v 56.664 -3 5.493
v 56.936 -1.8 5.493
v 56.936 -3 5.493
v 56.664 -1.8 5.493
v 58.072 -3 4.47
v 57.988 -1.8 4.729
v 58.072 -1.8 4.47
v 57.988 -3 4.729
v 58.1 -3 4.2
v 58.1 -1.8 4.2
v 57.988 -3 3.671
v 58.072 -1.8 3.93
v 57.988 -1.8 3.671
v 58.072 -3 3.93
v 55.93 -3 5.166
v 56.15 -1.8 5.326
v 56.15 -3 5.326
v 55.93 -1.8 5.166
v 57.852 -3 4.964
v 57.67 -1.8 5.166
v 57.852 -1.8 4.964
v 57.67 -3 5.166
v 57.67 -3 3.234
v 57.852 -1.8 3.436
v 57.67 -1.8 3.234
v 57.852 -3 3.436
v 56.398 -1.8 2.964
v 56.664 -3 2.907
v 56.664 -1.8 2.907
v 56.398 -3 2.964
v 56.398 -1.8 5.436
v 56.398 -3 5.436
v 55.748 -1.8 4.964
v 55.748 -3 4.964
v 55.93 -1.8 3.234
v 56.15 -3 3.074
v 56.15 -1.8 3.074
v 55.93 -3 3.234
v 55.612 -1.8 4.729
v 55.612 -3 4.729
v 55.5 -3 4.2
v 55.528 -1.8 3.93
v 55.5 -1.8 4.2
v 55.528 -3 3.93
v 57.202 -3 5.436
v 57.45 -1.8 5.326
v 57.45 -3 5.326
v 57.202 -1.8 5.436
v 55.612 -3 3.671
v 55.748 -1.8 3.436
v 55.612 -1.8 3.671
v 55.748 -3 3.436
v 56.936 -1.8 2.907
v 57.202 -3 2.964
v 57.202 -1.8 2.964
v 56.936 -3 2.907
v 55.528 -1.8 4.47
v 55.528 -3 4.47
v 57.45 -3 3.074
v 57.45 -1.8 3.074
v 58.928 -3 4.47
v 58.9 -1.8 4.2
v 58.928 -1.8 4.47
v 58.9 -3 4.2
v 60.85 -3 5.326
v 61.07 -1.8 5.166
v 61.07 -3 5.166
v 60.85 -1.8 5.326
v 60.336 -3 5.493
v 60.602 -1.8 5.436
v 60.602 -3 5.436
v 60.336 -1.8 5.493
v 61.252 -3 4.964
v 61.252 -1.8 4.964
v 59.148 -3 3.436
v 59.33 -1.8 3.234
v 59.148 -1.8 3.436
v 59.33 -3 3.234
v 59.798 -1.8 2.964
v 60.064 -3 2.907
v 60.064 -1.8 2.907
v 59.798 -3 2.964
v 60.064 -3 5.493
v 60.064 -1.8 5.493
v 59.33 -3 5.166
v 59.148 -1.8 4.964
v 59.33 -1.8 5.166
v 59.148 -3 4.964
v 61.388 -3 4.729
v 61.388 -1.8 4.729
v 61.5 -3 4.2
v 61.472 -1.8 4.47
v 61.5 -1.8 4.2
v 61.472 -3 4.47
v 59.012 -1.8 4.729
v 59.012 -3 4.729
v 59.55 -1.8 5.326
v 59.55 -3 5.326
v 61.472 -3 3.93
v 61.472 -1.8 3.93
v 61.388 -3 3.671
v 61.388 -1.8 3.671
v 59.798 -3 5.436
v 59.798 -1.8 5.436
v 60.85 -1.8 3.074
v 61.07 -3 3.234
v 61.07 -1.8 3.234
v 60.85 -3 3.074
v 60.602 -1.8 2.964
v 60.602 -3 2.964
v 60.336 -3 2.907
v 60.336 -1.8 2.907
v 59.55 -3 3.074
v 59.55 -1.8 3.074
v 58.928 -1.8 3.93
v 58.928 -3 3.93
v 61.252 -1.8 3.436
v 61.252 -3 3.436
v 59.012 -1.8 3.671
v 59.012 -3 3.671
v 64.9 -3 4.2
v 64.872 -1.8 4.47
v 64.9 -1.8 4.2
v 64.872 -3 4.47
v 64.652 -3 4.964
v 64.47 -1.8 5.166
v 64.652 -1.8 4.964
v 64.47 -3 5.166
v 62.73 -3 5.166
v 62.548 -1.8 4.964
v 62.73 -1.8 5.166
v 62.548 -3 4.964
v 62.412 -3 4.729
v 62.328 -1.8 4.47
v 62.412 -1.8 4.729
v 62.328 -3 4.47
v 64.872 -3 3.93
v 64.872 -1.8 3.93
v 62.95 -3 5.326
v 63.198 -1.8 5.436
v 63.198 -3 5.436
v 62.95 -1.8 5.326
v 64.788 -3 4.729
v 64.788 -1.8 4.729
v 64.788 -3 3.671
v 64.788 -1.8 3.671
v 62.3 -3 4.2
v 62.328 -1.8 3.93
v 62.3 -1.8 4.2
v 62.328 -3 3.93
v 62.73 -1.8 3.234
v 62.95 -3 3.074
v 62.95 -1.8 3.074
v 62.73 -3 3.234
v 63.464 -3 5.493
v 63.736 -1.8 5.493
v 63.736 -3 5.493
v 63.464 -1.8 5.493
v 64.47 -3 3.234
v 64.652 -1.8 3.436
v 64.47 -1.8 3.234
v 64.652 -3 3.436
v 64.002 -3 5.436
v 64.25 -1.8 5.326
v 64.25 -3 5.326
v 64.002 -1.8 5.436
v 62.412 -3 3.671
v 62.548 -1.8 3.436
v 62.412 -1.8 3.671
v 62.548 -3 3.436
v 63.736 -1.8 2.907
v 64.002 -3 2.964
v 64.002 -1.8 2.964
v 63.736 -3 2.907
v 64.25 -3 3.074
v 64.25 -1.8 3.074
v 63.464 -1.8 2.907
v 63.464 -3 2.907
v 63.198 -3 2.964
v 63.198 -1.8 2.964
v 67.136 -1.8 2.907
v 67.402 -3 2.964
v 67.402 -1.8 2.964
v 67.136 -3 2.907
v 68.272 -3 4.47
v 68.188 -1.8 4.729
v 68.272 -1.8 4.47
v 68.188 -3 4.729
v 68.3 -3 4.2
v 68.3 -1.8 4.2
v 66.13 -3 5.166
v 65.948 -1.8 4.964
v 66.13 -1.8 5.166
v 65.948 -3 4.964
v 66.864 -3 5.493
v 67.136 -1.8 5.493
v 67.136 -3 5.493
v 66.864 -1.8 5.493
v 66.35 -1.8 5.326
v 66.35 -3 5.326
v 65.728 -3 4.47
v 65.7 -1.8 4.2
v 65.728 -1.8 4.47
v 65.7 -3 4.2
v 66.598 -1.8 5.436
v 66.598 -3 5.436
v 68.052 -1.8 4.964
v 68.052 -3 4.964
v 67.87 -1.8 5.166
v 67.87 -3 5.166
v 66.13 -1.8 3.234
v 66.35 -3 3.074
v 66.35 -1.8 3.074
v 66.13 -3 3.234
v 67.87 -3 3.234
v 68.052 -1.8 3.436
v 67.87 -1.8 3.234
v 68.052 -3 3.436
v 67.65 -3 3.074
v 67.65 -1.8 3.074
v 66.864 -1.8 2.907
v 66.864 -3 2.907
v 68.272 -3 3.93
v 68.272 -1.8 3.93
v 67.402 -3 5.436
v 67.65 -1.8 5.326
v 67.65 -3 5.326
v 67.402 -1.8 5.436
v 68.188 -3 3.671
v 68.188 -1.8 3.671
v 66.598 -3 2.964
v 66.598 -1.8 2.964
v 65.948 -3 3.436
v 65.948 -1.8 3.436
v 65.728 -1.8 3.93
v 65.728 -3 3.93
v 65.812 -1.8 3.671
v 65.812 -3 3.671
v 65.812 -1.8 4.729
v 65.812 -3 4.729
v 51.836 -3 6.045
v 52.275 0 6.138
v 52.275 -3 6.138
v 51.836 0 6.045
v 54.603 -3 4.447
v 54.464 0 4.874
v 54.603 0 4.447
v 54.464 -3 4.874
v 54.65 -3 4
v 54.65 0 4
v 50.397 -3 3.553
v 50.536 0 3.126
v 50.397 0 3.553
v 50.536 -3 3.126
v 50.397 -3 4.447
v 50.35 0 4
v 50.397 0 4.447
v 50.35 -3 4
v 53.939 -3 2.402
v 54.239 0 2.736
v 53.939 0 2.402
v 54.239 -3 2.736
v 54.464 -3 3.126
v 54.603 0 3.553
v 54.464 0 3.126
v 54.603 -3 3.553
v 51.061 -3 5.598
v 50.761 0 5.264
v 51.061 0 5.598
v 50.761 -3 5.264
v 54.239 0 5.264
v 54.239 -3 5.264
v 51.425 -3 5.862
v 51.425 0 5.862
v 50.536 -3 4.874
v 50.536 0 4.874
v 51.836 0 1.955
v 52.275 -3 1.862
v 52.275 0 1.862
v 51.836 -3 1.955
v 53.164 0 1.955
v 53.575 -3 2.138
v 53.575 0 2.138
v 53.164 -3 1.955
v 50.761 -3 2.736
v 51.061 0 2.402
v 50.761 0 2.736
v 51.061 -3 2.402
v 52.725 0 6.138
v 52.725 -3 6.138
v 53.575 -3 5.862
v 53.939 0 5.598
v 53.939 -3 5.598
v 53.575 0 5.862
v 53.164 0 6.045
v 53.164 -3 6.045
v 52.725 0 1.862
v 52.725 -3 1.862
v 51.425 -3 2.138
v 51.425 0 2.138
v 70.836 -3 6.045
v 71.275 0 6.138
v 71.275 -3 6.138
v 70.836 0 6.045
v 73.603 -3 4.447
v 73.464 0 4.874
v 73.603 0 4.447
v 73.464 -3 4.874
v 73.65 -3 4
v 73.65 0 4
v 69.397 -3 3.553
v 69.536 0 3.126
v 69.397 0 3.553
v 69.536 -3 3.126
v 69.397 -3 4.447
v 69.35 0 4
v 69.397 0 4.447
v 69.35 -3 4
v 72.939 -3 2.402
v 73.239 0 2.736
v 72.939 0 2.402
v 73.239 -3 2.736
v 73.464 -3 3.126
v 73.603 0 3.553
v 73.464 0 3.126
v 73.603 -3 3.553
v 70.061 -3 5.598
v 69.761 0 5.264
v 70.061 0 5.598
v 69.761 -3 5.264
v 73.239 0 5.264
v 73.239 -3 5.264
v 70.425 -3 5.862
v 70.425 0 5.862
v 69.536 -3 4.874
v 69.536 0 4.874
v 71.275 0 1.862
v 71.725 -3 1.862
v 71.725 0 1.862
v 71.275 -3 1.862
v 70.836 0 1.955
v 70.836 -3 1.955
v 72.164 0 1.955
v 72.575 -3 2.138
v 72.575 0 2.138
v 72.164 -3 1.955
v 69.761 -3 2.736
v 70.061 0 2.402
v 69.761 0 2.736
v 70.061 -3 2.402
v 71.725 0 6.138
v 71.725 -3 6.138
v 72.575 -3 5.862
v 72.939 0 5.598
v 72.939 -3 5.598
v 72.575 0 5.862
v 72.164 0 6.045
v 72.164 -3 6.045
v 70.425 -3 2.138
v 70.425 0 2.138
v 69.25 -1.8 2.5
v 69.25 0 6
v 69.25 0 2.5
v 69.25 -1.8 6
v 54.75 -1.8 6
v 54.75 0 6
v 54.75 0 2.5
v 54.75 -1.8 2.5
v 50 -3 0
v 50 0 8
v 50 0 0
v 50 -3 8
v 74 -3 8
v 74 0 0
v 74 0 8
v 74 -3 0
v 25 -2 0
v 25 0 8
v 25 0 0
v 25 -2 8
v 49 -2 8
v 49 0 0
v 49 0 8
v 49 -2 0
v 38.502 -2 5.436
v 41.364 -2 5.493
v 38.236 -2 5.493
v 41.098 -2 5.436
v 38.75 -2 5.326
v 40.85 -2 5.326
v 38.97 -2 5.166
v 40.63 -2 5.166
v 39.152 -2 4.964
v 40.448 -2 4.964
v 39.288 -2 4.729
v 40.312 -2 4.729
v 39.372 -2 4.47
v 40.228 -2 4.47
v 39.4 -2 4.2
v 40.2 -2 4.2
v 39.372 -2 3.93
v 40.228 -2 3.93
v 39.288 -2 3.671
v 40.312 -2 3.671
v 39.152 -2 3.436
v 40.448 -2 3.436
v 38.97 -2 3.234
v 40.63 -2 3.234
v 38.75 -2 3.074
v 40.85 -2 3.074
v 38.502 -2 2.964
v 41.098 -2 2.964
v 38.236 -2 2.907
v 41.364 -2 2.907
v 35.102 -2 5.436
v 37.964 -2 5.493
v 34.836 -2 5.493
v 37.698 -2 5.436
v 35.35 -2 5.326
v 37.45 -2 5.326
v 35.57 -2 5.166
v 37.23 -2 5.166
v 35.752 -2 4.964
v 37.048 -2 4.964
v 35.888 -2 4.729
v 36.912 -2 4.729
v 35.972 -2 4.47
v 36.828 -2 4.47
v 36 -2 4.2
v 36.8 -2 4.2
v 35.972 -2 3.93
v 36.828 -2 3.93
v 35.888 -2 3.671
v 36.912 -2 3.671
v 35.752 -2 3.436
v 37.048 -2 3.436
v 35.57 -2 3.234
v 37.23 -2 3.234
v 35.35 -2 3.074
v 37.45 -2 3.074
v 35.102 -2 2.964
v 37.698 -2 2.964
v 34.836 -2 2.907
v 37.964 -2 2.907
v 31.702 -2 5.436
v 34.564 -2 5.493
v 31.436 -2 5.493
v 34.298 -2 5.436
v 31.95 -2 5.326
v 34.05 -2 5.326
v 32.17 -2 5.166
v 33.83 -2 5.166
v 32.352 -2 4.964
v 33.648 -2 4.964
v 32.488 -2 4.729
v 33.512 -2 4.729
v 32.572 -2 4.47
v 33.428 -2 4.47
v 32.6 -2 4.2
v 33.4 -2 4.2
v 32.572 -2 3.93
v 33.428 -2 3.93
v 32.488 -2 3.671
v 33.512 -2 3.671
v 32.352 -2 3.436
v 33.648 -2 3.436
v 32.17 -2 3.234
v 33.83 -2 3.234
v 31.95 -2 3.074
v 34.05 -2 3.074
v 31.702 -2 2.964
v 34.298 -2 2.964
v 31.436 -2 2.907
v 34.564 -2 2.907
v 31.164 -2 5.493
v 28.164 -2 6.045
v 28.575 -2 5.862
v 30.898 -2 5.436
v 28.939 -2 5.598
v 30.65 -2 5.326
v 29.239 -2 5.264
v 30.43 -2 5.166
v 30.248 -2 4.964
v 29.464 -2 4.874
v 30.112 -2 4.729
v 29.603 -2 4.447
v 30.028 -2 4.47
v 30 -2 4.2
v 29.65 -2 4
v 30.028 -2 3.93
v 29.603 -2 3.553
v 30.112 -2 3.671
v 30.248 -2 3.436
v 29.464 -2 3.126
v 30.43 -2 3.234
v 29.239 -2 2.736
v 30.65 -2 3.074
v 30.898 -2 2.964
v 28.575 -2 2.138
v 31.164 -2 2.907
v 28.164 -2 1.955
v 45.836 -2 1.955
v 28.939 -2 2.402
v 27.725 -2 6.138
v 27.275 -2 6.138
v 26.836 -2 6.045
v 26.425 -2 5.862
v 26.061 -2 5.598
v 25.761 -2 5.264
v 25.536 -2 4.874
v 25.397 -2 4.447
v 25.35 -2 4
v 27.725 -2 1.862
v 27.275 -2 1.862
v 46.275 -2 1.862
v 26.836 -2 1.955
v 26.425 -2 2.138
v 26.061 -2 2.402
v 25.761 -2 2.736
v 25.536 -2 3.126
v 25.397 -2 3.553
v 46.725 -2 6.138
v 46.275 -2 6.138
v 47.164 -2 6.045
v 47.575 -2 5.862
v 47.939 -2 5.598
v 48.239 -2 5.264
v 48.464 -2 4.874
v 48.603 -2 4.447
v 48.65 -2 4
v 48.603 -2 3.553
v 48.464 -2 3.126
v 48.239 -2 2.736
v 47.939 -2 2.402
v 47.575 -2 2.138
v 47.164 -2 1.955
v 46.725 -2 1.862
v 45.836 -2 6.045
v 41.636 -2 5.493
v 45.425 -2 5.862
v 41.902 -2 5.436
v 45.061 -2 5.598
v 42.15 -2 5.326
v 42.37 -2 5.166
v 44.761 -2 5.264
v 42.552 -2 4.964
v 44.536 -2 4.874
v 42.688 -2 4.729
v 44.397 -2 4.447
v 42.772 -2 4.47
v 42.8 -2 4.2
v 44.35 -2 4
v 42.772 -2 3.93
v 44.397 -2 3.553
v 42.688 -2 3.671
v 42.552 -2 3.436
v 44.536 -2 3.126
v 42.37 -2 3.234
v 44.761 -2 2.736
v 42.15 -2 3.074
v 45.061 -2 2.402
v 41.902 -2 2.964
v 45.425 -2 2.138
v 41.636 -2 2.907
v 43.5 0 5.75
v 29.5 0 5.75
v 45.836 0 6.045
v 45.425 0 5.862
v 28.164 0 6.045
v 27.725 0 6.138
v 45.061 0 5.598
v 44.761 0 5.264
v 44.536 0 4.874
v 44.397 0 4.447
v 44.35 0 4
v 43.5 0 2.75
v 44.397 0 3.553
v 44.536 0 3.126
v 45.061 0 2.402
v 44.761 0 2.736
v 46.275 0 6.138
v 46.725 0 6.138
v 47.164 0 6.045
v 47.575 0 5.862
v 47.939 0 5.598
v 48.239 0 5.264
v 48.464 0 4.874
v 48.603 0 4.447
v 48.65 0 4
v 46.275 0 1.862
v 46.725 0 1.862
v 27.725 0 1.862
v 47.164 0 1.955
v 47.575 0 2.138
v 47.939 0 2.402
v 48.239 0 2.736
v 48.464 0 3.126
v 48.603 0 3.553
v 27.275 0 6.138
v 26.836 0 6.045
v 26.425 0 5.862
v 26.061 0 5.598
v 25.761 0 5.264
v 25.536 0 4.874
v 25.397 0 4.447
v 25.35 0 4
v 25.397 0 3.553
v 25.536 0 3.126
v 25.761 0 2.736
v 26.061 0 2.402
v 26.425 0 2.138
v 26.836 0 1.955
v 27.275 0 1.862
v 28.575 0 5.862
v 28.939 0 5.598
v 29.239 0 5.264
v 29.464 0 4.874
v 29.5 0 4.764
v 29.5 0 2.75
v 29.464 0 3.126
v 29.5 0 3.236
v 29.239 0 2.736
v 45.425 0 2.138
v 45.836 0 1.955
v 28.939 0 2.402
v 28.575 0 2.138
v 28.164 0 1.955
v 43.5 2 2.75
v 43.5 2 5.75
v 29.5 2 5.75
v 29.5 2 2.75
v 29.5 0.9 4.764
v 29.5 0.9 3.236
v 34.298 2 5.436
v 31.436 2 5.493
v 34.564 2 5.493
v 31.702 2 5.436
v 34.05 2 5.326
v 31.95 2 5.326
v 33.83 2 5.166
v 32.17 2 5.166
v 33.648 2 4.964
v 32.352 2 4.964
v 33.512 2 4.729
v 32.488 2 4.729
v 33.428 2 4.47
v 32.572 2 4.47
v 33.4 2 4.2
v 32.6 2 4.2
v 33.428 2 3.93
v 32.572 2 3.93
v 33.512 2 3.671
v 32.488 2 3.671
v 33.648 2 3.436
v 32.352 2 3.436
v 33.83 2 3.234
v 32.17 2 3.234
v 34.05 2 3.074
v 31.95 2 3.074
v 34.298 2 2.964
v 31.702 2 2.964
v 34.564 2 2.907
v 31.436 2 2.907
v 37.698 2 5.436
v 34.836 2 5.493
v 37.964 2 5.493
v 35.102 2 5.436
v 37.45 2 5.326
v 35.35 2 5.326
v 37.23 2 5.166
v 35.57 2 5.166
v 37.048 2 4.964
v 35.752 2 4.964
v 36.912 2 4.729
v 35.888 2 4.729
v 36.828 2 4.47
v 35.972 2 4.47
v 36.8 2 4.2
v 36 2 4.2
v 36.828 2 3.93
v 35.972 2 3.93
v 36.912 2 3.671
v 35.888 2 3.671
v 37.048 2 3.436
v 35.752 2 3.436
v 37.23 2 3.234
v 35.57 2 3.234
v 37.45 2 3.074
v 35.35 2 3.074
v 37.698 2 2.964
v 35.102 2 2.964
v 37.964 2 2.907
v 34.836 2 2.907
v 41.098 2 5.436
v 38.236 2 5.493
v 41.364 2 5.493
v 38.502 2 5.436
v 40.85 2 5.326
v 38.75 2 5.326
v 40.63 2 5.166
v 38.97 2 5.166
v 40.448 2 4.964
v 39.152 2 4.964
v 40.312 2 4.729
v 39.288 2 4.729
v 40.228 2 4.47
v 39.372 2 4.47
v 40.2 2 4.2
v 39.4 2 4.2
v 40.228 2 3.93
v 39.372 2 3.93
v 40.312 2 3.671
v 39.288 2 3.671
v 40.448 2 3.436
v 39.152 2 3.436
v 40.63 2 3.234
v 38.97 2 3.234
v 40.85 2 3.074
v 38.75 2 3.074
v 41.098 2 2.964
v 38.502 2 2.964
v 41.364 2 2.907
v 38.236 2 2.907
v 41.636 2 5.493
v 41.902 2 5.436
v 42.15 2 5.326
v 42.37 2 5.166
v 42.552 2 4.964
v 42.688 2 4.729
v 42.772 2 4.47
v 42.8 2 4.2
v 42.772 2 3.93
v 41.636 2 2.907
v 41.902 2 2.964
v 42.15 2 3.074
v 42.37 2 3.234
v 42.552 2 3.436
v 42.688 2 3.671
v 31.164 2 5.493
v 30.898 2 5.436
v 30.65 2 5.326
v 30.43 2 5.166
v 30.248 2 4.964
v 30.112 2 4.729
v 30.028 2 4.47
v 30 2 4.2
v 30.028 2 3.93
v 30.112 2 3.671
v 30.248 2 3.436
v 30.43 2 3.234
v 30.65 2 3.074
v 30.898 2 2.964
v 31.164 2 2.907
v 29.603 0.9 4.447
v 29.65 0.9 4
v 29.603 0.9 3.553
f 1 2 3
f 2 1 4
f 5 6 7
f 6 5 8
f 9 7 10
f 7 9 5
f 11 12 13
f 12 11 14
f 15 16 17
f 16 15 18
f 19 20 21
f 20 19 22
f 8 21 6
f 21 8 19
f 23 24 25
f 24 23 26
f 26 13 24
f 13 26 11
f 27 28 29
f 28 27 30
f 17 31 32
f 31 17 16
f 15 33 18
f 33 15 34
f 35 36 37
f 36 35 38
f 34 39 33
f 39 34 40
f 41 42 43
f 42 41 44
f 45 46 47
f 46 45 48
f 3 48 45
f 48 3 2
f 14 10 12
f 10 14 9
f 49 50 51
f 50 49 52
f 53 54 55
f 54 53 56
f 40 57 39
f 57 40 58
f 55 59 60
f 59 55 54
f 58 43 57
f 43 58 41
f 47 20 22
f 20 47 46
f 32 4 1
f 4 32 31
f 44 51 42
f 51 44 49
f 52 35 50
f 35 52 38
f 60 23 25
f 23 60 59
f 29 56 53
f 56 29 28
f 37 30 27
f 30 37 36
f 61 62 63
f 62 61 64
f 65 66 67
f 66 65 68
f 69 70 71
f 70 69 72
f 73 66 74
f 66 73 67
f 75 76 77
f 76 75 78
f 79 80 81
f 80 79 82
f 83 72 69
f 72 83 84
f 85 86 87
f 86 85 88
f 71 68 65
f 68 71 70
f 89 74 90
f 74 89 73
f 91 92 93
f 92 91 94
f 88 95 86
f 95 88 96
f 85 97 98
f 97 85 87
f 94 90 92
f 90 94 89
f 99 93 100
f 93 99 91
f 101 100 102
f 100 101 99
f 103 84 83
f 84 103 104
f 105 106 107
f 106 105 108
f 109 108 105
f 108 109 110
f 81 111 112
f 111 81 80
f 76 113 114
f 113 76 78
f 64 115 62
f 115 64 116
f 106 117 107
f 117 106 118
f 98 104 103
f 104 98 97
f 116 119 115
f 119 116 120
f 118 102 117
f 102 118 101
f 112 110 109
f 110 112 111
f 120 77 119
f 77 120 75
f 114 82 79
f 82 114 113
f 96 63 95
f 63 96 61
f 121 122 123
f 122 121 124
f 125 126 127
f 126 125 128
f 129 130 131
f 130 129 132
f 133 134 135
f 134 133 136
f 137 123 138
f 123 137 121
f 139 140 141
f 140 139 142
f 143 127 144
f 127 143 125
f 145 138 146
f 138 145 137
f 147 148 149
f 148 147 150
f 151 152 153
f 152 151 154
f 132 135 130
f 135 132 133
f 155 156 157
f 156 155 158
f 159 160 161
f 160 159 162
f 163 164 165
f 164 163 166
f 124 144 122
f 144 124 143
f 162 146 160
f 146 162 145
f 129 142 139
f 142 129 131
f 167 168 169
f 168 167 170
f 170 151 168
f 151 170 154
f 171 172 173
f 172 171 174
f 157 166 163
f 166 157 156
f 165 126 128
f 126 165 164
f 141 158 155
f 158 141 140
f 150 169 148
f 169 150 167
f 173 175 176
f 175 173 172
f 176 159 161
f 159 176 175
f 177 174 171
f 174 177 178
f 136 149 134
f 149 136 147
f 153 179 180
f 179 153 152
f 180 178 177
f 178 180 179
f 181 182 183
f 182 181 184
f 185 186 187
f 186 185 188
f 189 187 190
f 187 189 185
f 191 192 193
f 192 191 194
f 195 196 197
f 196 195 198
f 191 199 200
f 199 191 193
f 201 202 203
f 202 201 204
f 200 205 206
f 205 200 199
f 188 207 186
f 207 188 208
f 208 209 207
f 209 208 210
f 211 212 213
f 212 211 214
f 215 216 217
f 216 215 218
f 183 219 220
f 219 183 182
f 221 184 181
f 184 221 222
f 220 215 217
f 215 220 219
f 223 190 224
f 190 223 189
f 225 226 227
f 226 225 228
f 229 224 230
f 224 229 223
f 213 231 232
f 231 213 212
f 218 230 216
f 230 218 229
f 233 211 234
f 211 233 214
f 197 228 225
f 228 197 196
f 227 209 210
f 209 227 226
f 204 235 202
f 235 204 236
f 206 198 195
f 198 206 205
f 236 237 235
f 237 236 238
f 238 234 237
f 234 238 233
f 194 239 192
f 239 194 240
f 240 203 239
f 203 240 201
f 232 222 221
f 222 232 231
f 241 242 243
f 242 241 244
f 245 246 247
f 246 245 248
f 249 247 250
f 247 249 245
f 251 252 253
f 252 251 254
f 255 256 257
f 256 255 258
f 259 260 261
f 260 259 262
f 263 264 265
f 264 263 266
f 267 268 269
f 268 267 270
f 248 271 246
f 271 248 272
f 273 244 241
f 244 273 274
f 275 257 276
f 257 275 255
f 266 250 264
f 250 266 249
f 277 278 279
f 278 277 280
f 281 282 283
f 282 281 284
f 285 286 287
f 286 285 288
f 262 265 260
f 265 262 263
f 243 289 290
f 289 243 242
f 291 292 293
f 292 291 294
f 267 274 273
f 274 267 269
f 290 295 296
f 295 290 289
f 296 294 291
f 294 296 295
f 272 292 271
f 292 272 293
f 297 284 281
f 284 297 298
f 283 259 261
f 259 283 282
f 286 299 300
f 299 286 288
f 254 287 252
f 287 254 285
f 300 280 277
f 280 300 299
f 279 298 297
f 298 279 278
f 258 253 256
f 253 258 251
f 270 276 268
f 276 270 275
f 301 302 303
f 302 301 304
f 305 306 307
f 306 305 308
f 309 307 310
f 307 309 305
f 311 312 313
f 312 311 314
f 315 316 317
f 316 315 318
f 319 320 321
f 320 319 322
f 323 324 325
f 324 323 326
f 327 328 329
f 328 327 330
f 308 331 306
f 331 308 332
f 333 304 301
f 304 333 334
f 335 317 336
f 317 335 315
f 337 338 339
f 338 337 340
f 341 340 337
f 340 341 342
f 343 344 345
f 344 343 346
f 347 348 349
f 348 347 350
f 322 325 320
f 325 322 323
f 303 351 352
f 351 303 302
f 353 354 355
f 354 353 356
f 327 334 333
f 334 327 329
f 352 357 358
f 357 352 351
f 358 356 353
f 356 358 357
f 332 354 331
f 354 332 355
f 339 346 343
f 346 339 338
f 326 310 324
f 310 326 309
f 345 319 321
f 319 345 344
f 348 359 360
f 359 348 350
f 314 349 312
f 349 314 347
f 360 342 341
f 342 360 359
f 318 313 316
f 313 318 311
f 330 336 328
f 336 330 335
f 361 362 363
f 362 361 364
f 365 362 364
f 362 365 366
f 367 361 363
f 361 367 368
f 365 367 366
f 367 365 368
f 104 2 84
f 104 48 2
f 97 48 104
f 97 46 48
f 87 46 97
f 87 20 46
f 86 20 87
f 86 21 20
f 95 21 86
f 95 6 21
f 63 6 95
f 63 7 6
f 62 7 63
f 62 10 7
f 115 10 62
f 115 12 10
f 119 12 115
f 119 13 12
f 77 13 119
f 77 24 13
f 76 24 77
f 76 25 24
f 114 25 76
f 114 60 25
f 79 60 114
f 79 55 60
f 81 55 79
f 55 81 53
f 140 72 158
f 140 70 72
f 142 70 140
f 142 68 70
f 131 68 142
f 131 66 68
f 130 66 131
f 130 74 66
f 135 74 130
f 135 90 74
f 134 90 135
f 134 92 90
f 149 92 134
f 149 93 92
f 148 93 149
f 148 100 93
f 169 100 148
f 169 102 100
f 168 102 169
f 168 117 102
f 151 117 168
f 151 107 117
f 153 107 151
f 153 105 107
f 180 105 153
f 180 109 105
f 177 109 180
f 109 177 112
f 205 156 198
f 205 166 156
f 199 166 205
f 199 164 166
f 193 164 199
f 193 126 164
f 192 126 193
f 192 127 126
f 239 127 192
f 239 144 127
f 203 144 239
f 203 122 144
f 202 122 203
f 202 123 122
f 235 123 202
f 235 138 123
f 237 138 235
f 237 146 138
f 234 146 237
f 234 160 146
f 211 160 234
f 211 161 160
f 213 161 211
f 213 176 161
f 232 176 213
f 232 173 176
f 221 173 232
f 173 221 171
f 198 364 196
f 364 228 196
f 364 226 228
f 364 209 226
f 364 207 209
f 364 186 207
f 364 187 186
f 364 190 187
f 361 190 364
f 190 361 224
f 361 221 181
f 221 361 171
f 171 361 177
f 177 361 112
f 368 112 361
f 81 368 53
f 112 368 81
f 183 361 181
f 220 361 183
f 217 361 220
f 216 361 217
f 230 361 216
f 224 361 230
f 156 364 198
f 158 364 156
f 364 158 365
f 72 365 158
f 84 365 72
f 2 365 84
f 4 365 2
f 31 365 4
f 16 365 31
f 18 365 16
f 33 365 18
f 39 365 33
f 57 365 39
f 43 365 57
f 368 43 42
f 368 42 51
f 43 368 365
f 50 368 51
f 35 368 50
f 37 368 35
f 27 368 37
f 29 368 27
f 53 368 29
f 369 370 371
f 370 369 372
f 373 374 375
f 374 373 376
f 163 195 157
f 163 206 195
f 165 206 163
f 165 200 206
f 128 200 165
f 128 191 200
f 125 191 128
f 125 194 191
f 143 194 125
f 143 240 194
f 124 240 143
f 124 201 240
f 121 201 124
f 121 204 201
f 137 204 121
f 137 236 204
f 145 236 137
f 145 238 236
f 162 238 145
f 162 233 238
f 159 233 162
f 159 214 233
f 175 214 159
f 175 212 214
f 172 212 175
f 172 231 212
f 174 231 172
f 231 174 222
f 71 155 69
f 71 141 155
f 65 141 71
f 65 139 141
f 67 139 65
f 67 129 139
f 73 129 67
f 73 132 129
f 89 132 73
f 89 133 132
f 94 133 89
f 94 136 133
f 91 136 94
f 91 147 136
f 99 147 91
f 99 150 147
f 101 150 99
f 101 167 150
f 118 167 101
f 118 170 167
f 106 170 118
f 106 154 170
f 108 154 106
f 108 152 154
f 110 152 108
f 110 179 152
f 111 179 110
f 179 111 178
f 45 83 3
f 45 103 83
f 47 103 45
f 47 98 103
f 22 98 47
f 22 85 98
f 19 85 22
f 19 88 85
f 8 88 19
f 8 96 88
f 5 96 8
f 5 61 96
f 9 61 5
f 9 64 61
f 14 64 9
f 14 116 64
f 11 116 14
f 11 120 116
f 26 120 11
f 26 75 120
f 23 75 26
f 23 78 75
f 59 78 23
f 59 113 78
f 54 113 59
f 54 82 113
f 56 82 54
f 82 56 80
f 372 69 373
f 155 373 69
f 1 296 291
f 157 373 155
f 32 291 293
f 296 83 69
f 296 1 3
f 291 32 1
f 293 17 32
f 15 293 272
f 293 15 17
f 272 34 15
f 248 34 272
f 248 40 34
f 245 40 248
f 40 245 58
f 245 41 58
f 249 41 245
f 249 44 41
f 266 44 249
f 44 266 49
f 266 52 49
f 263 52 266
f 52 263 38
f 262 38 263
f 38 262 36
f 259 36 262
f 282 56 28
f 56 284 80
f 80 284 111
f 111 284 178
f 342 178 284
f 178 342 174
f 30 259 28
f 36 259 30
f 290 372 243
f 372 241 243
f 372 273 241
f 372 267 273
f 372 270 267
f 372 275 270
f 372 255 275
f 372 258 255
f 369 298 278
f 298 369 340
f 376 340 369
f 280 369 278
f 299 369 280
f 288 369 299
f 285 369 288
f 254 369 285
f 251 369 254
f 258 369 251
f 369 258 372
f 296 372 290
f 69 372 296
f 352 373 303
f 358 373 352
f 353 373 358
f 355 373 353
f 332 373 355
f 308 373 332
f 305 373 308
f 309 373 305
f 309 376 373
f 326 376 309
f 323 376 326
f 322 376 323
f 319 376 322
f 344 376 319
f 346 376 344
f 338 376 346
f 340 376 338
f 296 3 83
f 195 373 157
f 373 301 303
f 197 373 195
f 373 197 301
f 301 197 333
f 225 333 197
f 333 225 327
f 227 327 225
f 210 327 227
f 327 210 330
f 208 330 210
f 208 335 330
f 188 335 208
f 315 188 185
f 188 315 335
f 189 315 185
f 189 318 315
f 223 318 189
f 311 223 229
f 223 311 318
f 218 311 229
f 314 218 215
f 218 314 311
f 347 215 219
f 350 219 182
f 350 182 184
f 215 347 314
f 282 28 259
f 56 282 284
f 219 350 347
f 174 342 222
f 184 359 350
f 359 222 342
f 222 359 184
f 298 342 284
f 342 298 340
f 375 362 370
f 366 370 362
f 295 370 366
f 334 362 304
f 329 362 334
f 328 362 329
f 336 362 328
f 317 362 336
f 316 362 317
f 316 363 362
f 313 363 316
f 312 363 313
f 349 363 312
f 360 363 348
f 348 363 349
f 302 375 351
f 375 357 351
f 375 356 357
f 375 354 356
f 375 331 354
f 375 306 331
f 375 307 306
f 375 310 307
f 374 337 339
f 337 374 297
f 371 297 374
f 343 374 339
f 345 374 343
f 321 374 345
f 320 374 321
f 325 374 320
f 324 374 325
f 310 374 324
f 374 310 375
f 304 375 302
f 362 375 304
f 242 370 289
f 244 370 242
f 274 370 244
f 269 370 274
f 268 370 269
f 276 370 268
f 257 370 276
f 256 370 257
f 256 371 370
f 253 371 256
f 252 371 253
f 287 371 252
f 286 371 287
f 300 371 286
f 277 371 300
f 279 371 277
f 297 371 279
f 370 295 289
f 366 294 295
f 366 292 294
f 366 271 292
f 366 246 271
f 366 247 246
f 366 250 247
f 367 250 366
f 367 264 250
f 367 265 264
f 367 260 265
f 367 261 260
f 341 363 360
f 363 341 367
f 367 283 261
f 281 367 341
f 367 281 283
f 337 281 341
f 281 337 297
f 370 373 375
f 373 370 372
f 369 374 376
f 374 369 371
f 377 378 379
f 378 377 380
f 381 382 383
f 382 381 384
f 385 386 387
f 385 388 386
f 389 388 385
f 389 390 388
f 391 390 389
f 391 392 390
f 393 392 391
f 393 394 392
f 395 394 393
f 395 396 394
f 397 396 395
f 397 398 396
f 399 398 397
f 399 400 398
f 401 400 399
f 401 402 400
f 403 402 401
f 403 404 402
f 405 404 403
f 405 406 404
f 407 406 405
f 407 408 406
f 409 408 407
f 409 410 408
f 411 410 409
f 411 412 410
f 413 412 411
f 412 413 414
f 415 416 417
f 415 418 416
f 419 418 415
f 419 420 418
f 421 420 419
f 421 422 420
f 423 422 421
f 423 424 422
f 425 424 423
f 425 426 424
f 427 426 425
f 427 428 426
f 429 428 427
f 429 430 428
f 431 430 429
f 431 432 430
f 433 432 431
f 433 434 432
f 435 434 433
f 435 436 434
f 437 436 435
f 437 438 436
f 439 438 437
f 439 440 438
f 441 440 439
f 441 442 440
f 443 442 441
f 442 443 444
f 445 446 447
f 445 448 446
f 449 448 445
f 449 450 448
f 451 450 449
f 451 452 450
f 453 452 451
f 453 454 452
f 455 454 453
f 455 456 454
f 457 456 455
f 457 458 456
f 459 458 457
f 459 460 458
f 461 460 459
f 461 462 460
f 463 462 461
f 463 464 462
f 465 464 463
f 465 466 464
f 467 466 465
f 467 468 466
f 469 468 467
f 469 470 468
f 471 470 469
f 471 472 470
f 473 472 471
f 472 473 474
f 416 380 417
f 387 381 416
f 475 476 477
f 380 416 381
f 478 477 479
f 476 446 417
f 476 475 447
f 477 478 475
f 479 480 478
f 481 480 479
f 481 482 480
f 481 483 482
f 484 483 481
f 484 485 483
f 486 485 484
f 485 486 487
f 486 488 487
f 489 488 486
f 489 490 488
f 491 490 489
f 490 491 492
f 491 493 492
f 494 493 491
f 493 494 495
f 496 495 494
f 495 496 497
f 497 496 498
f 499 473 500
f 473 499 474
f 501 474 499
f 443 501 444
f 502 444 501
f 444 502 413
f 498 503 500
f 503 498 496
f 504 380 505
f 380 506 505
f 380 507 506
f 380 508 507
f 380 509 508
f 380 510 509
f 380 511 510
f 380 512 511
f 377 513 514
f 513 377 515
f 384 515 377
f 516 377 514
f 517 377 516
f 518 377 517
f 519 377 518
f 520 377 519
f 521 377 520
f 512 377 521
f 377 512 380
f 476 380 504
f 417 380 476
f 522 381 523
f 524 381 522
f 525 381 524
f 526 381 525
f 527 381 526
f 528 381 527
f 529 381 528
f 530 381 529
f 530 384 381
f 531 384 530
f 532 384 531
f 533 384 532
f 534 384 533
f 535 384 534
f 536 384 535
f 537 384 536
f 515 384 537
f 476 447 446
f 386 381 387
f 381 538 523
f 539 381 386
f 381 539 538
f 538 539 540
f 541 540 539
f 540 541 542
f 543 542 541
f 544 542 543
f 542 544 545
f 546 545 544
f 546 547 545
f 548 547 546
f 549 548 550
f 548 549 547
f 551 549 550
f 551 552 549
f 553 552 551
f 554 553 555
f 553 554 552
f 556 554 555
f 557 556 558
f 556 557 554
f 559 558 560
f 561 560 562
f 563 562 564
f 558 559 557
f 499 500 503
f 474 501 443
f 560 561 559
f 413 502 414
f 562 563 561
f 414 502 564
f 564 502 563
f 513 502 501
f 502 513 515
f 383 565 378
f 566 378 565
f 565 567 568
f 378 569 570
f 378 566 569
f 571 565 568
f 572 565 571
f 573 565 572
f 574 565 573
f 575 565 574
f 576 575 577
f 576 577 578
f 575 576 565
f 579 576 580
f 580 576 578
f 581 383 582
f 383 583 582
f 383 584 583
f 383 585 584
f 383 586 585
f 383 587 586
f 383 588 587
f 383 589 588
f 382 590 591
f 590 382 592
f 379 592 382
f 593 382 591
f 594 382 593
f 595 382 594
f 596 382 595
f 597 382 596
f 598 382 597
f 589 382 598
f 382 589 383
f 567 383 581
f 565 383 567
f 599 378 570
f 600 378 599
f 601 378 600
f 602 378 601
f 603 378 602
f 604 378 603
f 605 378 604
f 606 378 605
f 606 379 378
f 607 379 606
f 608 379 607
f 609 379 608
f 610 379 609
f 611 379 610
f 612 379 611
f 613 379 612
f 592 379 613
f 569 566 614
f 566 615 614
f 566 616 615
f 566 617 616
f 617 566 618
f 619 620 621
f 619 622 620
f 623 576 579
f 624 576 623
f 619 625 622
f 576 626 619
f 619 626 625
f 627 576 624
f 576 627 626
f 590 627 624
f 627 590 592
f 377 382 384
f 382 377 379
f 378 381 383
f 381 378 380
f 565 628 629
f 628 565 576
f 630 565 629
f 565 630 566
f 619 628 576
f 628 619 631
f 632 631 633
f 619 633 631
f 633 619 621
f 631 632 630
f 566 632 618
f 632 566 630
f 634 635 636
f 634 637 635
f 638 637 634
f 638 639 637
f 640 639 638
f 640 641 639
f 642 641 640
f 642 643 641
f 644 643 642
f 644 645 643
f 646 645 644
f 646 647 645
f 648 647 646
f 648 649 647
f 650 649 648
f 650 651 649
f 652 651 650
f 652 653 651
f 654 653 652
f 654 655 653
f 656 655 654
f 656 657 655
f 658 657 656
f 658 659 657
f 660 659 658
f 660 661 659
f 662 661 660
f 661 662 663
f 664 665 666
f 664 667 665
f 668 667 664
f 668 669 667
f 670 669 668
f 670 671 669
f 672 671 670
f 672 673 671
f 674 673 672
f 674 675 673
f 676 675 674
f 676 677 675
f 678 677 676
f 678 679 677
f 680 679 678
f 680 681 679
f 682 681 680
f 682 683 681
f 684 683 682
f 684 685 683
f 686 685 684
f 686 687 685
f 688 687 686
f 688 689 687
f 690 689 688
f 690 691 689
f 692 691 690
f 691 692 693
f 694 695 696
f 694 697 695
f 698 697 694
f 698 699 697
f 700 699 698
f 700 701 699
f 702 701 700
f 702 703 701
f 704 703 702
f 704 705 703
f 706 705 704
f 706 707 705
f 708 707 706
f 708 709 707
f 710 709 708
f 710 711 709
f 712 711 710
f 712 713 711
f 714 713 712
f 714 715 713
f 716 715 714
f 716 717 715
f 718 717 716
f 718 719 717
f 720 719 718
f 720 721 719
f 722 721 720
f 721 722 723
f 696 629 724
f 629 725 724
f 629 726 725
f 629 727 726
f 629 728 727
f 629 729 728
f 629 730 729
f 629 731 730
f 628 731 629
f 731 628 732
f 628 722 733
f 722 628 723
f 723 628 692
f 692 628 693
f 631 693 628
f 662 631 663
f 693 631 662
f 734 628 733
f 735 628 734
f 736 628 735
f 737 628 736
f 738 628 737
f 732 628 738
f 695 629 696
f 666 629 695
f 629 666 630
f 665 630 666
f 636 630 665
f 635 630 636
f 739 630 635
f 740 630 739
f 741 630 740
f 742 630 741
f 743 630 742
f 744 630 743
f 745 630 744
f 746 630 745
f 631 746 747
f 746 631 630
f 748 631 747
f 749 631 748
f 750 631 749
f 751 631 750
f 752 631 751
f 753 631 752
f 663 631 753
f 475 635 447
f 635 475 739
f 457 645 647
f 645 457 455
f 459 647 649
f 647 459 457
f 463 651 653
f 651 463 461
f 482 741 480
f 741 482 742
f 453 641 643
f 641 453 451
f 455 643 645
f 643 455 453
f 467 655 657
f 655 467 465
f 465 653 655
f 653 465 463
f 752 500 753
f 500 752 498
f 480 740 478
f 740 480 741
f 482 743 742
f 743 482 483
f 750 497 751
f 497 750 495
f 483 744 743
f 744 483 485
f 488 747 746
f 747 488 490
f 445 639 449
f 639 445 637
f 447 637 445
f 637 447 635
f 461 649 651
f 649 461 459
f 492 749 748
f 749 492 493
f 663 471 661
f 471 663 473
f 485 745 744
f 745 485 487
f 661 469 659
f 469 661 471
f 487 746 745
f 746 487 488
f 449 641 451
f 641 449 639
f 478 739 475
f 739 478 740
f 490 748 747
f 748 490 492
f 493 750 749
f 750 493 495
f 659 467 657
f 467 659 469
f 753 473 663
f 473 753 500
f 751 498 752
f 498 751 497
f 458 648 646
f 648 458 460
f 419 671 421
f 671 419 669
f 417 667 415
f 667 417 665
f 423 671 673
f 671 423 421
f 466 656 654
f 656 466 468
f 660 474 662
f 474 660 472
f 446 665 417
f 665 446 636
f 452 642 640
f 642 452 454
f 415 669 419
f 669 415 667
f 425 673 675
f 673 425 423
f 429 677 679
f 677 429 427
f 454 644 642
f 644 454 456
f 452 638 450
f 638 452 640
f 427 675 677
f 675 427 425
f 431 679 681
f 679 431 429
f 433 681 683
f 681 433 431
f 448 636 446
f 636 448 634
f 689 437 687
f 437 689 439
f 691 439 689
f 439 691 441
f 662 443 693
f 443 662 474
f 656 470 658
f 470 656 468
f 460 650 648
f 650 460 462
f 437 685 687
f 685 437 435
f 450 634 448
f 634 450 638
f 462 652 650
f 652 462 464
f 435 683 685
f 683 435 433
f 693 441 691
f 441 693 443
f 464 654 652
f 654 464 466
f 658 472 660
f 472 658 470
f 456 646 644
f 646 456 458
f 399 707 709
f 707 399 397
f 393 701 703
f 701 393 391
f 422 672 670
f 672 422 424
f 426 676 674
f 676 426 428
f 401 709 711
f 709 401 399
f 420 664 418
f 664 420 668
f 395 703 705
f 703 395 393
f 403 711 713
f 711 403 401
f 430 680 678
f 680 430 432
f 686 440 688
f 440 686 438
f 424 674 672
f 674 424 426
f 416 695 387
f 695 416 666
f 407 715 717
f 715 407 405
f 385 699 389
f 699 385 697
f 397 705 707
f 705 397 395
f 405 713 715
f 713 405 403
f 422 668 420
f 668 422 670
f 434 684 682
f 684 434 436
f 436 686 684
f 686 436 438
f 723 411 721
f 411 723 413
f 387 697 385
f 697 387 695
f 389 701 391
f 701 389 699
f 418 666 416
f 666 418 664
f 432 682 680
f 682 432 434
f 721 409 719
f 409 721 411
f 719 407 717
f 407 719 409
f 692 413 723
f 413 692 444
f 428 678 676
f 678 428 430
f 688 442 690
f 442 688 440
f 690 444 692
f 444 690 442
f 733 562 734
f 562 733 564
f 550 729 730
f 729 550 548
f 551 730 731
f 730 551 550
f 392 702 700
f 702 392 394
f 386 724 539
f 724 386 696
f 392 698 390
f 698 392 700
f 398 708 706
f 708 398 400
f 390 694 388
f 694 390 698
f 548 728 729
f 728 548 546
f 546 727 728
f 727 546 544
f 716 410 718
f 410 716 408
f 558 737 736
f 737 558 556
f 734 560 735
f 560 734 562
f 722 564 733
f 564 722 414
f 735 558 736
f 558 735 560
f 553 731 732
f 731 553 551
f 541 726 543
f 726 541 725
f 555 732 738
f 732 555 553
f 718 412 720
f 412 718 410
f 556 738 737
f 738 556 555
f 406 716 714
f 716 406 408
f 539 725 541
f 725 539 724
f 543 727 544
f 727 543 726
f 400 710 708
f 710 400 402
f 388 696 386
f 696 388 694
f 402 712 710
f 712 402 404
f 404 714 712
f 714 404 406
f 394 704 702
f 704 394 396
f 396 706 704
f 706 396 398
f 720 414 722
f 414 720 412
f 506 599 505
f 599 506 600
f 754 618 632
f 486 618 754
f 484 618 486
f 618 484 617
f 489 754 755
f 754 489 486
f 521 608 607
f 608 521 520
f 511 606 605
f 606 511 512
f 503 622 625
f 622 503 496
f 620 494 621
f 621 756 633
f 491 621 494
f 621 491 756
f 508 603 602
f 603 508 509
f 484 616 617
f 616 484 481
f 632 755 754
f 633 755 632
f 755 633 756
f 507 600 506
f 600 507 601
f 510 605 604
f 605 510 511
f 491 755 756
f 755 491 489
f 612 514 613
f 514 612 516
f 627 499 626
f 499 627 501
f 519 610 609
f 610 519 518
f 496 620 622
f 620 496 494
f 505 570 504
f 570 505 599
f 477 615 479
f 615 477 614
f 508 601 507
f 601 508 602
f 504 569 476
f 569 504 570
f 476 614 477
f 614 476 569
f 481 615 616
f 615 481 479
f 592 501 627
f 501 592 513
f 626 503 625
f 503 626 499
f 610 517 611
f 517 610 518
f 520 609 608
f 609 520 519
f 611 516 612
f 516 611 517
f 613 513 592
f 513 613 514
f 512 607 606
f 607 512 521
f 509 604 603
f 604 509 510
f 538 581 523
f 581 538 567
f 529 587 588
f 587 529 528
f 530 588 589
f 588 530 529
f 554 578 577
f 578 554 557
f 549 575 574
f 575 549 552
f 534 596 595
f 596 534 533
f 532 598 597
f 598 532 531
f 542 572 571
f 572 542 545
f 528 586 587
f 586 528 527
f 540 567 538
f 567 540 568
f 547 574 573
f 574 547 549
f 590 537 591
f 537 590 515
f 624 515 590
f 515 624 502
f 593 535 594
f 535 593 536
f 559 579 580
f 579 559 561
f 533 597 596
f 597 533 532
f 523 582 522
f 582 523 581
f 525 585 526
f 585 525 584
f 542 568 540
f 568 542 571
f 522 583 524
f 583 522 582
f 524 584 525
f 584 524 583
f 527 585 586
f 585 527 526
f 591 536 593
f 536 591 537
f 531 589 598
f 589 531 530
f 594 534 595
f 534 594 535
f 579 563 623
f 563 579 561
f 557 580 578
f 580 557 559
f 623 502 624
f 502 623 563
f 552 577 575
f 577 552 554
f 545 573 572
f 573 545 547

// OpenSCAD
/*

__________ ____ ___  _____________  __.___.____    .____     
\______   \    |   \/   _____/    |/ _|   |    |   |    |    
 |    |  _/    |   /\_____  \|      < |   |    |   |    |    
 |    |   \    |  / /        \    |  \|   |    |___|    |___ 
 |_______ /______/ /_______  / ___|__ \___|_______ \_______ \
                              \/     \/           \/       \/
                                                  \/       \/                  

*/
/*                      
Buskill USB-A Magnetic breakaway Shell Assembly     
GNU General Public License v3.0 
Author: Melanie Allen
*/



/*
Description

BusKill is a Dead Man Switch triggered when a magnetic breakaway is tripped, severing a USB connection. This design is for USB-A.

The user will have a USB, a USB extension cable, and the magnetic breakaway. 

The "release" is connected to a USB extension cord that terminates with the female USB port that receives a USB.  It contains 4 pogo pins directly soldered to the female usb port and 1 oval magnet. It separates from the release when the cord is pulled. (red)

The "breakaway" is connected to the cord that terminates with the male USB and inserts the computer. It contains 4 pins terminating in pogo receptors and 1 round  magnet and a plastic case. (pink)

When the magnets on the breakaway and release connect, the pogo pins and pogo receptors must meet and establish the USB connection.

The breakaway and release plugs must be designed asymmetrically to prevent the connection from happening the wrong way. 

In this version I have borrowed these mangets and pogo receptors from the Supplier verison of the BusKill cable.

docs.buskill.in
buskill.in
*/



//magnet variables

//release magnet

magnet_position_x=3;
magnet_position_z=18.1;
magnet_position_y=4;
magnet_distance=19;

//breakaway magnet

//USB_port variables
u_h = 14.2;
u_w = 13.5;
u_d = 5.7;

//pogo variables

pogo_length=7.6;
pogo_diameter=2.6; //+.3 +.2 +.2 +.2
pogo_distance=.8; //distance between pins 
shift=2; //distance from pins 
shift2=2; //distance from top

//receptor variables

//breakaway variables
i_h = 24; //x
i_w = 8; //z
i_d = 20; //y

//release variables
i_l_h =i_h; //x
i_l_w = i_w; //z
i_l_d = 20; //y

//pogo pins

module pogos(){
    translate([-.7,-.1,4.2]){
        translate([shift,0,0])rotate ([90,0,0])cylinder($fn = 30, $fa = 30, $fs = 2, h=pogo_length, r1=pogo_diameter/2, r2=pogo_diameter/2, center = true);
    translate([pogo_distance+pogo_diameter+shift,0,0])rotate ([90,0,0])cylinder($fn = 30, $fa = 30, $fs = 1.8, h=pogo_length, r1=pogo_diameter/2, r2=pogo_diameter/2, center = true);
            translate([(pogo_distance+pogo_diameter)*2+shift,0,0])rotate ([90,0,0])cylinder($fn = 30, $fa = 30, $fs = 2, h=pogo_length, r1=pogo_diameter/2, r2=pogo_diameter/2, center = true);
    translate([(pogo_distance+pogo_diameter)*3+shift,0,0])rotate ([90,0,0])cylinder($fn = 30, $fa = 30, $fs = 1.8, h=pogo_length, r1=pogo_diameter/2, r2=pogo_diameter/2, center = true);
}
}

//pogos();

module usb(){
    color("grey",.1)translate([-1,3.8,0])cube(size = [u_h,u_w,u_d],center=false);
}

//usb();
//pogo receptors

module recs(){

}

//recs();

module magnet(){
   color("grey") rotate ([90,0,0])translate([magnet_position_x,magnet_position_y,magnet_position_z])cylinder($fn = 30, $fa = 30, $fs = 2, h=4, r1=2.15, r2=2.15, center = true);
    
   color("grey") rotate ([90,0,0])translate([magnet_position_x+magnet_distance,magnet_position_y,magnet_position_z])cylinder($fn = 30, $fa = 30, $fs = 2, h=4, r1=2.15, r2=2.15, center = true);
    

}

//magnet();

//

x=0;
y=0;
module void(){
    
usb();
    translate([x,y,0])pogos();
translate([-5.5,17,0])magnet();
}

// void();


module void2(){
translate([30+x,y,.0])pogos();
translate([24.5,17,0])magnet();
}
//void2();

/* * Blocks * */

    module release_block(){
       
    color("Red",.55)
 rotate([90,0,0]){
{
                cube(size = [i_l_h, i_l_w, i_l_d], center = false);
            }
        } 
    } 
 
   // release_block();
   module assemble3(){ 
    difference(){
       release_block();
    translate([5,-i_l_d+3,0])void();


}

 //translate([5,-i_l_d+3,0])void();
}

//outie block

pogo_house_x = 14;
pogo_house_y = 2;
pogo_house_z =3;
pogo_house_pos_x= 29.5;
pogo_house_pos_y= 0;
pogo_house_pos_z= 2.75;


block_distance=25;    
        module breakaway_block(){
    color("Pink",.55)
 rotate([90,0,0]){
            translate([block_distance,0,0]){
                cube(size = [i_h, i_w, 2], center = false);
            }
        } 
    translate([pogo_house_pos_x,pogo_house_pos_y,pogo_house_pos_z])cube(size = [pogo_house_x,pogo_house_y,pogo_house_z], center=false);
        } 
  //breakaway_block();
        
     
 
 //innie block

innie_tolerance=.5;         
        
 block_distance2=25;    
        module breakaway_block2(){
    color("purple",.55)
 translate([25,0,0])rotate([90,0,0]){
            translate([block_distance2,0,0]){
                cube(size = [i_h, i_w, 3], center = false);
            }
        } 
        }        
//breakaway_block2();
     
 pogo_house2_pos_x= pogo_house_pos_x+25.5;
 pogo_house2_pos_y= pogo_house_pos_y-1.8;
 pogo_house2_pos_z= pogo_house_pos_z;  
        
 module void3(){
     translate([pogo_house2_pos_x-(innie_tolerance*.5),pogo_house2_pos_y,pogo_house2_pos_z-(innie_tolerance*.5)])cube(size = [pogo_house_x+innie_tolerance,pogo_house_y+innie_tolerance,pogo_house_z+innie_tolerance], center=false);
     translate([55.5,-2.6,0])pogos();
     translate([49.5,16.5,0])magnet();
     }    
        
//void3();    
 
 module assemble2(){
 difference(){
 breakaway_block2();
 void3();
 }    
 }
 assemble2();
    
module assemble(){
translate([0,0,0])difference(){
      breakaway_block();
    void2();
   
}
}

assemble();   
